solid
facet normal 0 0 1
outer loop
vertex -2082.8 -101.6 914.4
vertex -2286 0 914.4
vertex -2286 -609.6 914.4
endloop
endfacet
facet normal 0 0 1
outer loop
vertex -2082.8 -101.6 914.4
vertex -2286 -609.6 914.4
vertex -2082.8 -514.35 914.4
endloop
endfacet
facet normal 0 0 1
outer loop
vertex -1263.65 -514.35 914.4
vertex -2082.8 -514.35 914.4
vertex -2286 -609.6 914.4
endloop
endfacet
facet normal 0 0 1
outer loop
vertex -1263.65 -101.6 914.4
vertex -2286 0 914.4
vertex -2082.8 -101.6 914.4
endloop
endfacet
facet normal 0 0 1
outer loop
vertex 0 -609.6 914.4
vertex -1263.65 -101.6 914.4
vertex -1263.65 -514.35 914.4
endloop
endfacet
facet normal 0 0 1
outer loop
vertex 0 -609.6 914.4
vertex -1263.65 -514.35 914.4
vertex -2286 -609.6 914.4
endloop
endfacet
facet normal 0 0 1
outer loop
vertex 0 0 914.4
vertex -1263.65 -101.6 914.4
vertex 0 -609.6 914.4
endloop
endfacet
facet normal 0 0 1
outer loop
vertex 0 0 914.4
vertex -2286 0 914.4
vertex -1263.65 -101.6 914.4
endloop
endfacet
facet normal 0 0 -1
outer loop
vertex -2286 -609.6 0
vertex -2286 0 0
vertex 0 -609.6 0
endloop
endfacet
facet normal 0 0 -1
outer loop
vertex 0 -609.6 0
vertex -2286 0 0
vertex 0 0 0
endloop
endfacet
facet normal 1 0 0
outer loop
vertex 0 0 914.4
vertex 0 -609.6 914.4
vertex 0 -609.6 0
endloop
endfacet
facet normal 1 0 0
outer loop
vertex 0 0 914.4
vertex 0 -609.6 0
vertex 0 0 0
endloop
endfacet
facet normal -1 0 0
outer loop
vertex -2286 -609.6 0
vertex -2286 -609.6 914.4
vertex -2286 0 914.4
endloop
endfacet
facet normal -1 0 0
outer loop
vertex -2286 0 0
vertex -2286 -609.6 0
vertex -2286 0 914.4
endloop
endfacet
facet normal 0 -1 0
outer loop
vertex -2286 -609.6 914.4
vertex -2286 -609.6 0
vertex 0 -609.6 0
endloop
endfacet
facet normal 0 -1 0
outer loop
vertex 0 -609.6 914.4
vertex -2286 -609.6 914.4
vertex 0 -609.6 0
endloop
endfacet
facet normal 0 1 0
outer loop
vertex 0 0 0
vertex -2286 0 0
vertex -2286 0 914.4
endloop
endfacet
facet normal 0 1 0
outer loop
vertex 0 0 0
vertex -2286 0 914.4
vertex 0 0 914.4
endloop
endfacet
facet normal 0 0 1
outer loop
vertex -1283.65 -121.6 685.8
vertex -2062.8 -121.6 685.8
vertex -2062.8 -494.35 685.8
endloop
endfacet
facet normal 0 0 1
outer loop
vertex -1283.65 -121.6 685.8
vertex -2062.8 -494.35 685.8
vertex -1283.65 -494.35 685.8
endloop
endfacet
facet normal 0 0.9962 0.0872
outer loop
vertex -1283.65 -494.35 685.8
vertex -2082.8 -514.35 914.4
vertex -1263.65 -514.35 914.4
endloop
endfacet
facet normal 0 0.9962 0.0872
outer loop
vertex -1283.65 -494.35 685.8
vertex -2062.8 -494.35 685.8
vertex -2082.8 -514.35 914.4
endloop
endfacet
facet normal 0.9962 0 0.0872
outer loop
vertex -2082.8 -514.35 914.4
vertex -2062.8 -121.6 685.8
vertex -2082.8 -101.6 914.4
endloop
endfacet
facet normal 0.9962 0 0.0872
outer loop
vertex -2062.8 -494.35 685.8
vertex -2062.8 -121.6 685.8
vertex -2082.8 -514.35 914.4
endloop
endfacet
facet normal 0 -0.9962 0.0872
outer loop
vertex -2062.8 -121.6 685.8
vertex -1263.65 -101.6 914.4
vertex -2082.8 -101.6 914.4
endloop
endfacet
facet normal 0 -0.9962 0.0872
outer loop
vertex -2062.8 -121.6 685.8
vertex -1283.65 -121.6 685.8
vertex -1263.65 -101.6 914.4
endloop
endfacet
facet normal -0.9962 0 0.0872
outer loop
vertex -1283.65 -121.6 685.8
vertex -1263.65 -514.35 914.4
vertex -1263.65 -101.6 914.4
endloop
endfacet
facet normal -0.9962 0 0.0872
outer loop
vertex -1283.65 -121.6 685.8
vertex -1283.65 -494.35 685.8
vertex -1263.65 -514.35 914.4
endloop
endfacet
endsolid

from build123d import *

# Parameters (mm, degrees)
F0_W     = 2286
F0_H     = 609.6
F1_DEPTH = 914.4
F2_W     = 819.15
F2_H     = 412.75
F3_DEPTH = 228.6
F3_TAPER = 5


with BuildPart() as f1:
    # F0 (on Top) → F1 (new body)
    with BuildSketch(Plane.XY):
        with Locations((-1143, -304.8)):
            Rectangle(F0_W, F0_H)
    extrude(amount=F1_DEPTH)

    # F2 (on face) → F3 (cut)
    with BuildSketch(Plane.XY.offset(914.4)):
        with Locations((-1673.225, -307.975)):
            Rectangle(F2_W, F2_H)
    extrude(amount=-F3_DEPTH, taper=F3_TAPER, mode=Mode.SUBTRACT)


solid = f1.part
